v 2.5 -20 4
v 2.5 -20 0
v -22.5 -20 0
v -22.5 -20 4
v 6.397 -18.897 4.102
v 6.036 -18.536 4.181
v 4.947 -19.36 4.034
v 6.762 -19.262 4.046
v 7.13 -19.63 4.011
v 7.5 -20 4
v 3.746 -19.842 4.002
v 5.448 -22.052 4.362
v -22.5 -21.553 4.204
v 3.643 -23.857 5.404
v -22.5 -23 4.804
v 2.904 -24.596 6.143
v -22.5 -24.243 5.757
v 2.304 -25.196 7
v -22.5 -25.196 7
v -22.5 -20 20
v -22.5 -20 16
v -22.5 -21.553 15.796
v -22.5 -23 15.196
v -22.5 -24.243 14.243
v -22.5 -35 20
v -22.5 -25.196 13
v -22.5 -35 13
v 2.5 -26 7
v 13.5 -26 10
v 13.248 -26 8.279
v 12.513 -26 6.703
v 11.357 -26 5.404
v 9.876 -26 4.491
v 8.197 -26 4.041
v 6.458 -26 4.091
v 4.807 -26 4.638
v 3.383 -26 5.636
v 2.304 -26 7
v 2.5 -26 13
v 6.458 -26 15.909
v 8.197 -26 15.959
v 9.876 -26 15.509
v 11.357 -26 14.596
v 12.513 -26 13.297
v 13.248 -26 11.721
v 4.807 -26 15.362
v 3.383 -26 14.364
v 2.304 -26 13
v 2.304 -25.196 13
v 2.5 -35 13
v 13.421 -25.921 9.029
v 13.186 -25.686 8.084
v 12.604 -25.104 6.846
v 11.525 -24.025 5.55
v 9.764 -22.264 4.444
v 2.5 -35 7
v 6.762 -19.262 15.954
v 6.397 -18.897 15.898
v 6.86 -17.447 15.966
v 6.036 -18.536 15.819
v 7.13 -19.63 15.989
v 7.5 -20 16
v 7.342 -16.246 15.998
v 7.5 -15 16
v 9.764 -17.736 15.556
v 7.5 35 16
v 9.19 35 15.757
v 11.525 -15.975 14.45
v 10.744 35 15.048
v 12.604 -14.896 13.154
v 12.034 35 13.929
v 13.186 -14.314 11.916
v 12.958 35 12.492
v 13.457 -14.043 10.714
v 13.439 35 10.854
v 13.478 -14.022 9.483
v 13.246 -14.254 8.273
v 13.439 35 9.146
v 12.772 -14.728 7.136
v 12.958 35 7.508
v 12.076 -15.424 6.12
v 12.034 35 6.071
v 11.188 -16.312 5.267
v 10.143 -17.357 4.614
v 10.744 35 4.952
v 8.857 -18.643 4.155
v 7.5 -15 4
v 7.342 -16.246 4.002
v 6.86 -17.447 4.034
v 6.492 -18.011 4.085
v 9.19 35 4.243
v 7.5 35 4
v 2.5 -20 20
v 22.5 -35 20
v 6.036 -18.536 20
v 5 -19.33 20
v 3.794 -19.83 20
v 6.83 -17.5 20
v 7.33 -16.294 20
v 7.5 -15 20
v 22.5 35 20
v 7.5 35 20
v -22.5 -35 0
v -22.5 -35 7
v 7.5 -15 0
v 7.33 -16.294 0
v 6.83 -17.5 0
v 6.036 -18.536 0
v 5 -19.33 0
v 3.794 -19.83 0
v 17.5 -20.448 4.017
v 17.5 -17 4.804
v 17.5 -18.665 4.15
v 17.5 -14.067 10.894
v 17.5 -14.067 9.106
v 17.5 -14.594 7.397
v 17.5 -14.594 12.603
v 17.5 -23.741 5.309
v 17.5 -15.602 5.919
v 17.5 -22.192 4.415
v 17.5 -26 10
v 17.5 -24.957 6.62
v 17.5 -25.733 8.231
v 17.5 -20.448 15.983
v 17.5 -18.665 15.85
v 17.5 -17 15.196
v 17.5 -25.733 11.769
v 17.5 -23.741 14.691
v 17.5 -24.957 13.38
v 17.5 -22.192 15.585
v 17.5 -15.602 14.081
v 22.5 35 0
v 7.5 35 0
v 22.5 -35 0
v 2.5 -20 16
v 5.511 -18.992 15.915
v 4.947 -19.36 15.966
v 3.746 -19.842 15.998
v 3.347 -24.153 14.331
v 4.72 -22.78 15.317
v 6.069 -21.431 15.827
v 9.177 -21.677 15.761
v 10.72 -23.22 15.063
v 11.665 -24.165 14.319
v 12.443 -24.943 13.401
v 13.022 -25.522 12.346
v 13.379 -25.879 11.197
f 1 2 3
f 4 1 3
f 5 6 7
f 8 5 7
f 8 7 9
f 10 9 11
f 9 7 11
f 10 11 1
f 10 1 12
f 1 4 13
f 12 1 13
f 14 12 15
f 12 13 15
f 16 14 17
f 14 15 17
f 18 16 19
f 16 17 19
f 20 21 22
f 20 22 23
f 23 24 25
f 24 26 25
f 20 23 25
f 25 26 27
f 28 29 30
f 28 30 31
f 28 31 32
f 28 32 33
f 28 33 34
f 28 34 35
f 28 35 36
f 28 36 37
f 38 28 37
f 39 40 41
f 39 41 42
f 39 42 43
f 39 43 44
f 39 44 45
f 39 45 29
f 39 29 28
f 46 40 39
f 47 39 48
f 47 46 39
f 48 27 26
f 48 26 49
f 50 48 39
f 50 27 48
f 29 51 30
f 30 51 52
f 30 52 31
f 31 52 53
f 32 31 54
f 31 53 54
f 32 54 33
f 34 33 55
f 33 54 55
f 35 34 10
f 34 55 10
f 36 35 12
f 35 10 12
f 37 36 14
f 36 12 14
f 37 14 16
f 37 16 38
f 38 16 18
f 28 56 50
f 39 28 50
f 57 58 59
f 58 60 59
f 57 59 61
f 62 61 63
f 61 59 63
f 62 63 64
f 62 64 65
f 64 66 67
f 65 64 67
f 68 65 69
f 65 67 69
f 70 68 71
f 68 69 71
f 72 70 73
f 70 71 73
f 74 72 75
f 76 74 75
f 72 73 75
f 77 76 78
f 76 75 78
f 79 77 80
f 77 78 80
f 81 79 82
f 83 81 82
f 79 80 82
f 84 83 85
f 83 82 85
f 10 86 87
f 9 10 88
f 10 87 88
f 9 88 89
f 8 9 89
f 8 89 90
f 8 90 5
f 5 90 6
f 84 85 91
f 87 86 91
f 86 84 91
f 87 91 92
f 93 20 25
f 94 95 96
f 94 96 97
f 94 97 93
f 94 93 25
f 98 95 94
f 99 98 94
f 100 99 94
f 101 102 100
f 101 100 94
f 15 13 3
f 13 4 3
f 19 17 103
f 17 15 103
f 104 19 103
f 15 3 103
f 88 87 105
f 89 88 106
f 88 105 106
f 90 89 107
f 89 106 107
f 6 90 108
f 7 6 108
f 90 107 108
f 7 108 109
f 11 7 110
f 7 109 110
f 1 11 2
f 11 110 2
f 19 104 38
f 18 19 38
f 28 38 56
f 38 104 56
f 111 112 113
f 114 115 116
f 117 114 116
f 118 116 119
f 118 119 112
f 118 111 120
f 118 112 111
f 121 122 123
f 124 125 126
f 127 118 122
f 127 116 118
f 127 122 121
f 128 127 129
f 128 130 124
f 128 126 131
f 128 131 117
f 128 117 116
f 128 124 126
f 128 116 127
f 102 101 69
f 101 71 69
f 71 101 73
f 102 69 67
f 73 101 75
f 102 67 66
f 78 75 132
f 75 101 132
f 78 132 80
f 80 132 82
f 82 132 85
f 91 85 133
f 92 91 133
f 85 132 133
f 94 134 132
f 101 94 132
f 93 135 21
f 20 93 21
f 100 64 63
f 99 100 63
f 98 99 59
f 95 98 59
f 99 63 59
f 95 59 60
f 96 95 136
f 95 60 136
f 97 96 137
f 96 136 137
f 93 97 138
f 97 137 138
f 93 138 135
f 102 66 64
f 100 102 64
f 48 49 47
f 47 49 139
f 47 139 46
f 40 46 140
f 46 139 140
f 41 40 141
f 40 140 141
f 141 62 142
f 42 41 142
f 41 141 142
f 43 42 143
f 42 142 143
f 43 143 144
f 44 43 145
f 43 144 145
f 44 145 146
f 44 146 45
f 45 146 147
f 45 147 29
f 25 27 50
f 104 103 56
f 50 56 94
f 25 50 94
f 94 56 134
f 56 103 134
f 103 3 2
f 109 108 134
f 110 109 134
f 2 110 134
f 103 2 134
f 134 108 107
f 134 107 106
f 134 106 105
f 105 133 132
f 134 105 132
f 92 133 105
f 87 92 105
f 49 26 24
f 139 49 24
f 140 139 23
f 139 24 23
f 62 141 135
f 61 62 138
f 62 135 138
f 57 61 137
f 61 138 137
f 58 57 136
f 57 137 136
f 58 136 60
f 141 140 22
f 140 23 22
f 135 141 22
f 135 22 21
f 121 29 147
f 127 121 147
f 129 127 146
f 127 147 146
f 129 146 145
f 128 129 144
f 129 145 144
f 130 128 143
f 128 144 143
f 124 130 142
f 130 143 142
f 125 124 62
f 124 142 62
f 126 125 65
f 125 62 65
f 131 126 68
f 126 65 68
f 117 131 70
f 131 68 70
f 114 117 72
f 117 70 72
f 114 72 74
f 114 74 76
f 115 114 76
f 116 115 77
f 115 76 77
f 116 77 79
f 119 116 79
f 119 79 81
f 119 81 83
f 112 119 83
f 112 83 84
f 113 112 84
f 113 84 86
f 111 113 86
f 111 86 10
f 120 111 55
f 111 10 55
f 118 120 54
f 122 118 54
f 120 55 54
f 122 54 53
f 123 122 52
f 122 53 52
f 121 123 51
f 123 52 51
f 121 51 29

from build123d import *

# Parameters (mm, degrees)
F1_DEPTH = 20
F2_R     = 6
F3_DEPTH = 40
F4_R     = 6
F5_DEPTH = 61
F6_W     = 25
F6_H     = 6
F7_DEPTH = 25


with BuildPart() as f1:
    # F0 (on Top) → F1 (new body)
    with BuildSketch(Plane.XY):
        with BuildLine():
            Line((22.5, 35), (7.5, 35))
            Line((7.5, 35), (7.5, -15))
            ThreePointArc((7.5, -15), (6.035534, -18.535534), (2.5, -20))
            Line((2.5, -20), (-22.5, -20))
            Line((-22.5, -20), (-22.5, -35))
            Line((-22.5, -35), (22.5, -35))
            Line((22.5, -35), (22.5, 35))
        make_face()
    extrude(amount=F1_DEPTH)

    # F2 (on face) → F3 (cut)
    with BuildSketch(Plane(origin=(-22.5, 0, 0), x_dir=(0, -1, 0), z_dir=(-1, 0, 0))):
        with Locations((20, 10)):
            Circle(F2_R)
    extrude(amount=-F3_DEPTH, mode=Mode.SUBTRACT)

    # F4 (on face) → F5 (cut)
    with BuildSketch(Plane(origin=(0, 35, 0), x_dir=(-1, 0, 0), z_dir=(0, 1, 0))):
        with Locations((-7.5, 10)):
            Circle(F4_R)
    extrude(amount=-F5_DEPTH, mode=Mode.SUBTRACT)

    # F6 (on face) → F7 (cut)
    with BuildSketch(Plane.XZ.offset(35)):
        with Locations((-10, 10)):
            Rectangle(F6_W, F6_H)
    extrude(amount=-F7_DEPTH, mode=Mode.SUBTRACT)


solid = f1.part
